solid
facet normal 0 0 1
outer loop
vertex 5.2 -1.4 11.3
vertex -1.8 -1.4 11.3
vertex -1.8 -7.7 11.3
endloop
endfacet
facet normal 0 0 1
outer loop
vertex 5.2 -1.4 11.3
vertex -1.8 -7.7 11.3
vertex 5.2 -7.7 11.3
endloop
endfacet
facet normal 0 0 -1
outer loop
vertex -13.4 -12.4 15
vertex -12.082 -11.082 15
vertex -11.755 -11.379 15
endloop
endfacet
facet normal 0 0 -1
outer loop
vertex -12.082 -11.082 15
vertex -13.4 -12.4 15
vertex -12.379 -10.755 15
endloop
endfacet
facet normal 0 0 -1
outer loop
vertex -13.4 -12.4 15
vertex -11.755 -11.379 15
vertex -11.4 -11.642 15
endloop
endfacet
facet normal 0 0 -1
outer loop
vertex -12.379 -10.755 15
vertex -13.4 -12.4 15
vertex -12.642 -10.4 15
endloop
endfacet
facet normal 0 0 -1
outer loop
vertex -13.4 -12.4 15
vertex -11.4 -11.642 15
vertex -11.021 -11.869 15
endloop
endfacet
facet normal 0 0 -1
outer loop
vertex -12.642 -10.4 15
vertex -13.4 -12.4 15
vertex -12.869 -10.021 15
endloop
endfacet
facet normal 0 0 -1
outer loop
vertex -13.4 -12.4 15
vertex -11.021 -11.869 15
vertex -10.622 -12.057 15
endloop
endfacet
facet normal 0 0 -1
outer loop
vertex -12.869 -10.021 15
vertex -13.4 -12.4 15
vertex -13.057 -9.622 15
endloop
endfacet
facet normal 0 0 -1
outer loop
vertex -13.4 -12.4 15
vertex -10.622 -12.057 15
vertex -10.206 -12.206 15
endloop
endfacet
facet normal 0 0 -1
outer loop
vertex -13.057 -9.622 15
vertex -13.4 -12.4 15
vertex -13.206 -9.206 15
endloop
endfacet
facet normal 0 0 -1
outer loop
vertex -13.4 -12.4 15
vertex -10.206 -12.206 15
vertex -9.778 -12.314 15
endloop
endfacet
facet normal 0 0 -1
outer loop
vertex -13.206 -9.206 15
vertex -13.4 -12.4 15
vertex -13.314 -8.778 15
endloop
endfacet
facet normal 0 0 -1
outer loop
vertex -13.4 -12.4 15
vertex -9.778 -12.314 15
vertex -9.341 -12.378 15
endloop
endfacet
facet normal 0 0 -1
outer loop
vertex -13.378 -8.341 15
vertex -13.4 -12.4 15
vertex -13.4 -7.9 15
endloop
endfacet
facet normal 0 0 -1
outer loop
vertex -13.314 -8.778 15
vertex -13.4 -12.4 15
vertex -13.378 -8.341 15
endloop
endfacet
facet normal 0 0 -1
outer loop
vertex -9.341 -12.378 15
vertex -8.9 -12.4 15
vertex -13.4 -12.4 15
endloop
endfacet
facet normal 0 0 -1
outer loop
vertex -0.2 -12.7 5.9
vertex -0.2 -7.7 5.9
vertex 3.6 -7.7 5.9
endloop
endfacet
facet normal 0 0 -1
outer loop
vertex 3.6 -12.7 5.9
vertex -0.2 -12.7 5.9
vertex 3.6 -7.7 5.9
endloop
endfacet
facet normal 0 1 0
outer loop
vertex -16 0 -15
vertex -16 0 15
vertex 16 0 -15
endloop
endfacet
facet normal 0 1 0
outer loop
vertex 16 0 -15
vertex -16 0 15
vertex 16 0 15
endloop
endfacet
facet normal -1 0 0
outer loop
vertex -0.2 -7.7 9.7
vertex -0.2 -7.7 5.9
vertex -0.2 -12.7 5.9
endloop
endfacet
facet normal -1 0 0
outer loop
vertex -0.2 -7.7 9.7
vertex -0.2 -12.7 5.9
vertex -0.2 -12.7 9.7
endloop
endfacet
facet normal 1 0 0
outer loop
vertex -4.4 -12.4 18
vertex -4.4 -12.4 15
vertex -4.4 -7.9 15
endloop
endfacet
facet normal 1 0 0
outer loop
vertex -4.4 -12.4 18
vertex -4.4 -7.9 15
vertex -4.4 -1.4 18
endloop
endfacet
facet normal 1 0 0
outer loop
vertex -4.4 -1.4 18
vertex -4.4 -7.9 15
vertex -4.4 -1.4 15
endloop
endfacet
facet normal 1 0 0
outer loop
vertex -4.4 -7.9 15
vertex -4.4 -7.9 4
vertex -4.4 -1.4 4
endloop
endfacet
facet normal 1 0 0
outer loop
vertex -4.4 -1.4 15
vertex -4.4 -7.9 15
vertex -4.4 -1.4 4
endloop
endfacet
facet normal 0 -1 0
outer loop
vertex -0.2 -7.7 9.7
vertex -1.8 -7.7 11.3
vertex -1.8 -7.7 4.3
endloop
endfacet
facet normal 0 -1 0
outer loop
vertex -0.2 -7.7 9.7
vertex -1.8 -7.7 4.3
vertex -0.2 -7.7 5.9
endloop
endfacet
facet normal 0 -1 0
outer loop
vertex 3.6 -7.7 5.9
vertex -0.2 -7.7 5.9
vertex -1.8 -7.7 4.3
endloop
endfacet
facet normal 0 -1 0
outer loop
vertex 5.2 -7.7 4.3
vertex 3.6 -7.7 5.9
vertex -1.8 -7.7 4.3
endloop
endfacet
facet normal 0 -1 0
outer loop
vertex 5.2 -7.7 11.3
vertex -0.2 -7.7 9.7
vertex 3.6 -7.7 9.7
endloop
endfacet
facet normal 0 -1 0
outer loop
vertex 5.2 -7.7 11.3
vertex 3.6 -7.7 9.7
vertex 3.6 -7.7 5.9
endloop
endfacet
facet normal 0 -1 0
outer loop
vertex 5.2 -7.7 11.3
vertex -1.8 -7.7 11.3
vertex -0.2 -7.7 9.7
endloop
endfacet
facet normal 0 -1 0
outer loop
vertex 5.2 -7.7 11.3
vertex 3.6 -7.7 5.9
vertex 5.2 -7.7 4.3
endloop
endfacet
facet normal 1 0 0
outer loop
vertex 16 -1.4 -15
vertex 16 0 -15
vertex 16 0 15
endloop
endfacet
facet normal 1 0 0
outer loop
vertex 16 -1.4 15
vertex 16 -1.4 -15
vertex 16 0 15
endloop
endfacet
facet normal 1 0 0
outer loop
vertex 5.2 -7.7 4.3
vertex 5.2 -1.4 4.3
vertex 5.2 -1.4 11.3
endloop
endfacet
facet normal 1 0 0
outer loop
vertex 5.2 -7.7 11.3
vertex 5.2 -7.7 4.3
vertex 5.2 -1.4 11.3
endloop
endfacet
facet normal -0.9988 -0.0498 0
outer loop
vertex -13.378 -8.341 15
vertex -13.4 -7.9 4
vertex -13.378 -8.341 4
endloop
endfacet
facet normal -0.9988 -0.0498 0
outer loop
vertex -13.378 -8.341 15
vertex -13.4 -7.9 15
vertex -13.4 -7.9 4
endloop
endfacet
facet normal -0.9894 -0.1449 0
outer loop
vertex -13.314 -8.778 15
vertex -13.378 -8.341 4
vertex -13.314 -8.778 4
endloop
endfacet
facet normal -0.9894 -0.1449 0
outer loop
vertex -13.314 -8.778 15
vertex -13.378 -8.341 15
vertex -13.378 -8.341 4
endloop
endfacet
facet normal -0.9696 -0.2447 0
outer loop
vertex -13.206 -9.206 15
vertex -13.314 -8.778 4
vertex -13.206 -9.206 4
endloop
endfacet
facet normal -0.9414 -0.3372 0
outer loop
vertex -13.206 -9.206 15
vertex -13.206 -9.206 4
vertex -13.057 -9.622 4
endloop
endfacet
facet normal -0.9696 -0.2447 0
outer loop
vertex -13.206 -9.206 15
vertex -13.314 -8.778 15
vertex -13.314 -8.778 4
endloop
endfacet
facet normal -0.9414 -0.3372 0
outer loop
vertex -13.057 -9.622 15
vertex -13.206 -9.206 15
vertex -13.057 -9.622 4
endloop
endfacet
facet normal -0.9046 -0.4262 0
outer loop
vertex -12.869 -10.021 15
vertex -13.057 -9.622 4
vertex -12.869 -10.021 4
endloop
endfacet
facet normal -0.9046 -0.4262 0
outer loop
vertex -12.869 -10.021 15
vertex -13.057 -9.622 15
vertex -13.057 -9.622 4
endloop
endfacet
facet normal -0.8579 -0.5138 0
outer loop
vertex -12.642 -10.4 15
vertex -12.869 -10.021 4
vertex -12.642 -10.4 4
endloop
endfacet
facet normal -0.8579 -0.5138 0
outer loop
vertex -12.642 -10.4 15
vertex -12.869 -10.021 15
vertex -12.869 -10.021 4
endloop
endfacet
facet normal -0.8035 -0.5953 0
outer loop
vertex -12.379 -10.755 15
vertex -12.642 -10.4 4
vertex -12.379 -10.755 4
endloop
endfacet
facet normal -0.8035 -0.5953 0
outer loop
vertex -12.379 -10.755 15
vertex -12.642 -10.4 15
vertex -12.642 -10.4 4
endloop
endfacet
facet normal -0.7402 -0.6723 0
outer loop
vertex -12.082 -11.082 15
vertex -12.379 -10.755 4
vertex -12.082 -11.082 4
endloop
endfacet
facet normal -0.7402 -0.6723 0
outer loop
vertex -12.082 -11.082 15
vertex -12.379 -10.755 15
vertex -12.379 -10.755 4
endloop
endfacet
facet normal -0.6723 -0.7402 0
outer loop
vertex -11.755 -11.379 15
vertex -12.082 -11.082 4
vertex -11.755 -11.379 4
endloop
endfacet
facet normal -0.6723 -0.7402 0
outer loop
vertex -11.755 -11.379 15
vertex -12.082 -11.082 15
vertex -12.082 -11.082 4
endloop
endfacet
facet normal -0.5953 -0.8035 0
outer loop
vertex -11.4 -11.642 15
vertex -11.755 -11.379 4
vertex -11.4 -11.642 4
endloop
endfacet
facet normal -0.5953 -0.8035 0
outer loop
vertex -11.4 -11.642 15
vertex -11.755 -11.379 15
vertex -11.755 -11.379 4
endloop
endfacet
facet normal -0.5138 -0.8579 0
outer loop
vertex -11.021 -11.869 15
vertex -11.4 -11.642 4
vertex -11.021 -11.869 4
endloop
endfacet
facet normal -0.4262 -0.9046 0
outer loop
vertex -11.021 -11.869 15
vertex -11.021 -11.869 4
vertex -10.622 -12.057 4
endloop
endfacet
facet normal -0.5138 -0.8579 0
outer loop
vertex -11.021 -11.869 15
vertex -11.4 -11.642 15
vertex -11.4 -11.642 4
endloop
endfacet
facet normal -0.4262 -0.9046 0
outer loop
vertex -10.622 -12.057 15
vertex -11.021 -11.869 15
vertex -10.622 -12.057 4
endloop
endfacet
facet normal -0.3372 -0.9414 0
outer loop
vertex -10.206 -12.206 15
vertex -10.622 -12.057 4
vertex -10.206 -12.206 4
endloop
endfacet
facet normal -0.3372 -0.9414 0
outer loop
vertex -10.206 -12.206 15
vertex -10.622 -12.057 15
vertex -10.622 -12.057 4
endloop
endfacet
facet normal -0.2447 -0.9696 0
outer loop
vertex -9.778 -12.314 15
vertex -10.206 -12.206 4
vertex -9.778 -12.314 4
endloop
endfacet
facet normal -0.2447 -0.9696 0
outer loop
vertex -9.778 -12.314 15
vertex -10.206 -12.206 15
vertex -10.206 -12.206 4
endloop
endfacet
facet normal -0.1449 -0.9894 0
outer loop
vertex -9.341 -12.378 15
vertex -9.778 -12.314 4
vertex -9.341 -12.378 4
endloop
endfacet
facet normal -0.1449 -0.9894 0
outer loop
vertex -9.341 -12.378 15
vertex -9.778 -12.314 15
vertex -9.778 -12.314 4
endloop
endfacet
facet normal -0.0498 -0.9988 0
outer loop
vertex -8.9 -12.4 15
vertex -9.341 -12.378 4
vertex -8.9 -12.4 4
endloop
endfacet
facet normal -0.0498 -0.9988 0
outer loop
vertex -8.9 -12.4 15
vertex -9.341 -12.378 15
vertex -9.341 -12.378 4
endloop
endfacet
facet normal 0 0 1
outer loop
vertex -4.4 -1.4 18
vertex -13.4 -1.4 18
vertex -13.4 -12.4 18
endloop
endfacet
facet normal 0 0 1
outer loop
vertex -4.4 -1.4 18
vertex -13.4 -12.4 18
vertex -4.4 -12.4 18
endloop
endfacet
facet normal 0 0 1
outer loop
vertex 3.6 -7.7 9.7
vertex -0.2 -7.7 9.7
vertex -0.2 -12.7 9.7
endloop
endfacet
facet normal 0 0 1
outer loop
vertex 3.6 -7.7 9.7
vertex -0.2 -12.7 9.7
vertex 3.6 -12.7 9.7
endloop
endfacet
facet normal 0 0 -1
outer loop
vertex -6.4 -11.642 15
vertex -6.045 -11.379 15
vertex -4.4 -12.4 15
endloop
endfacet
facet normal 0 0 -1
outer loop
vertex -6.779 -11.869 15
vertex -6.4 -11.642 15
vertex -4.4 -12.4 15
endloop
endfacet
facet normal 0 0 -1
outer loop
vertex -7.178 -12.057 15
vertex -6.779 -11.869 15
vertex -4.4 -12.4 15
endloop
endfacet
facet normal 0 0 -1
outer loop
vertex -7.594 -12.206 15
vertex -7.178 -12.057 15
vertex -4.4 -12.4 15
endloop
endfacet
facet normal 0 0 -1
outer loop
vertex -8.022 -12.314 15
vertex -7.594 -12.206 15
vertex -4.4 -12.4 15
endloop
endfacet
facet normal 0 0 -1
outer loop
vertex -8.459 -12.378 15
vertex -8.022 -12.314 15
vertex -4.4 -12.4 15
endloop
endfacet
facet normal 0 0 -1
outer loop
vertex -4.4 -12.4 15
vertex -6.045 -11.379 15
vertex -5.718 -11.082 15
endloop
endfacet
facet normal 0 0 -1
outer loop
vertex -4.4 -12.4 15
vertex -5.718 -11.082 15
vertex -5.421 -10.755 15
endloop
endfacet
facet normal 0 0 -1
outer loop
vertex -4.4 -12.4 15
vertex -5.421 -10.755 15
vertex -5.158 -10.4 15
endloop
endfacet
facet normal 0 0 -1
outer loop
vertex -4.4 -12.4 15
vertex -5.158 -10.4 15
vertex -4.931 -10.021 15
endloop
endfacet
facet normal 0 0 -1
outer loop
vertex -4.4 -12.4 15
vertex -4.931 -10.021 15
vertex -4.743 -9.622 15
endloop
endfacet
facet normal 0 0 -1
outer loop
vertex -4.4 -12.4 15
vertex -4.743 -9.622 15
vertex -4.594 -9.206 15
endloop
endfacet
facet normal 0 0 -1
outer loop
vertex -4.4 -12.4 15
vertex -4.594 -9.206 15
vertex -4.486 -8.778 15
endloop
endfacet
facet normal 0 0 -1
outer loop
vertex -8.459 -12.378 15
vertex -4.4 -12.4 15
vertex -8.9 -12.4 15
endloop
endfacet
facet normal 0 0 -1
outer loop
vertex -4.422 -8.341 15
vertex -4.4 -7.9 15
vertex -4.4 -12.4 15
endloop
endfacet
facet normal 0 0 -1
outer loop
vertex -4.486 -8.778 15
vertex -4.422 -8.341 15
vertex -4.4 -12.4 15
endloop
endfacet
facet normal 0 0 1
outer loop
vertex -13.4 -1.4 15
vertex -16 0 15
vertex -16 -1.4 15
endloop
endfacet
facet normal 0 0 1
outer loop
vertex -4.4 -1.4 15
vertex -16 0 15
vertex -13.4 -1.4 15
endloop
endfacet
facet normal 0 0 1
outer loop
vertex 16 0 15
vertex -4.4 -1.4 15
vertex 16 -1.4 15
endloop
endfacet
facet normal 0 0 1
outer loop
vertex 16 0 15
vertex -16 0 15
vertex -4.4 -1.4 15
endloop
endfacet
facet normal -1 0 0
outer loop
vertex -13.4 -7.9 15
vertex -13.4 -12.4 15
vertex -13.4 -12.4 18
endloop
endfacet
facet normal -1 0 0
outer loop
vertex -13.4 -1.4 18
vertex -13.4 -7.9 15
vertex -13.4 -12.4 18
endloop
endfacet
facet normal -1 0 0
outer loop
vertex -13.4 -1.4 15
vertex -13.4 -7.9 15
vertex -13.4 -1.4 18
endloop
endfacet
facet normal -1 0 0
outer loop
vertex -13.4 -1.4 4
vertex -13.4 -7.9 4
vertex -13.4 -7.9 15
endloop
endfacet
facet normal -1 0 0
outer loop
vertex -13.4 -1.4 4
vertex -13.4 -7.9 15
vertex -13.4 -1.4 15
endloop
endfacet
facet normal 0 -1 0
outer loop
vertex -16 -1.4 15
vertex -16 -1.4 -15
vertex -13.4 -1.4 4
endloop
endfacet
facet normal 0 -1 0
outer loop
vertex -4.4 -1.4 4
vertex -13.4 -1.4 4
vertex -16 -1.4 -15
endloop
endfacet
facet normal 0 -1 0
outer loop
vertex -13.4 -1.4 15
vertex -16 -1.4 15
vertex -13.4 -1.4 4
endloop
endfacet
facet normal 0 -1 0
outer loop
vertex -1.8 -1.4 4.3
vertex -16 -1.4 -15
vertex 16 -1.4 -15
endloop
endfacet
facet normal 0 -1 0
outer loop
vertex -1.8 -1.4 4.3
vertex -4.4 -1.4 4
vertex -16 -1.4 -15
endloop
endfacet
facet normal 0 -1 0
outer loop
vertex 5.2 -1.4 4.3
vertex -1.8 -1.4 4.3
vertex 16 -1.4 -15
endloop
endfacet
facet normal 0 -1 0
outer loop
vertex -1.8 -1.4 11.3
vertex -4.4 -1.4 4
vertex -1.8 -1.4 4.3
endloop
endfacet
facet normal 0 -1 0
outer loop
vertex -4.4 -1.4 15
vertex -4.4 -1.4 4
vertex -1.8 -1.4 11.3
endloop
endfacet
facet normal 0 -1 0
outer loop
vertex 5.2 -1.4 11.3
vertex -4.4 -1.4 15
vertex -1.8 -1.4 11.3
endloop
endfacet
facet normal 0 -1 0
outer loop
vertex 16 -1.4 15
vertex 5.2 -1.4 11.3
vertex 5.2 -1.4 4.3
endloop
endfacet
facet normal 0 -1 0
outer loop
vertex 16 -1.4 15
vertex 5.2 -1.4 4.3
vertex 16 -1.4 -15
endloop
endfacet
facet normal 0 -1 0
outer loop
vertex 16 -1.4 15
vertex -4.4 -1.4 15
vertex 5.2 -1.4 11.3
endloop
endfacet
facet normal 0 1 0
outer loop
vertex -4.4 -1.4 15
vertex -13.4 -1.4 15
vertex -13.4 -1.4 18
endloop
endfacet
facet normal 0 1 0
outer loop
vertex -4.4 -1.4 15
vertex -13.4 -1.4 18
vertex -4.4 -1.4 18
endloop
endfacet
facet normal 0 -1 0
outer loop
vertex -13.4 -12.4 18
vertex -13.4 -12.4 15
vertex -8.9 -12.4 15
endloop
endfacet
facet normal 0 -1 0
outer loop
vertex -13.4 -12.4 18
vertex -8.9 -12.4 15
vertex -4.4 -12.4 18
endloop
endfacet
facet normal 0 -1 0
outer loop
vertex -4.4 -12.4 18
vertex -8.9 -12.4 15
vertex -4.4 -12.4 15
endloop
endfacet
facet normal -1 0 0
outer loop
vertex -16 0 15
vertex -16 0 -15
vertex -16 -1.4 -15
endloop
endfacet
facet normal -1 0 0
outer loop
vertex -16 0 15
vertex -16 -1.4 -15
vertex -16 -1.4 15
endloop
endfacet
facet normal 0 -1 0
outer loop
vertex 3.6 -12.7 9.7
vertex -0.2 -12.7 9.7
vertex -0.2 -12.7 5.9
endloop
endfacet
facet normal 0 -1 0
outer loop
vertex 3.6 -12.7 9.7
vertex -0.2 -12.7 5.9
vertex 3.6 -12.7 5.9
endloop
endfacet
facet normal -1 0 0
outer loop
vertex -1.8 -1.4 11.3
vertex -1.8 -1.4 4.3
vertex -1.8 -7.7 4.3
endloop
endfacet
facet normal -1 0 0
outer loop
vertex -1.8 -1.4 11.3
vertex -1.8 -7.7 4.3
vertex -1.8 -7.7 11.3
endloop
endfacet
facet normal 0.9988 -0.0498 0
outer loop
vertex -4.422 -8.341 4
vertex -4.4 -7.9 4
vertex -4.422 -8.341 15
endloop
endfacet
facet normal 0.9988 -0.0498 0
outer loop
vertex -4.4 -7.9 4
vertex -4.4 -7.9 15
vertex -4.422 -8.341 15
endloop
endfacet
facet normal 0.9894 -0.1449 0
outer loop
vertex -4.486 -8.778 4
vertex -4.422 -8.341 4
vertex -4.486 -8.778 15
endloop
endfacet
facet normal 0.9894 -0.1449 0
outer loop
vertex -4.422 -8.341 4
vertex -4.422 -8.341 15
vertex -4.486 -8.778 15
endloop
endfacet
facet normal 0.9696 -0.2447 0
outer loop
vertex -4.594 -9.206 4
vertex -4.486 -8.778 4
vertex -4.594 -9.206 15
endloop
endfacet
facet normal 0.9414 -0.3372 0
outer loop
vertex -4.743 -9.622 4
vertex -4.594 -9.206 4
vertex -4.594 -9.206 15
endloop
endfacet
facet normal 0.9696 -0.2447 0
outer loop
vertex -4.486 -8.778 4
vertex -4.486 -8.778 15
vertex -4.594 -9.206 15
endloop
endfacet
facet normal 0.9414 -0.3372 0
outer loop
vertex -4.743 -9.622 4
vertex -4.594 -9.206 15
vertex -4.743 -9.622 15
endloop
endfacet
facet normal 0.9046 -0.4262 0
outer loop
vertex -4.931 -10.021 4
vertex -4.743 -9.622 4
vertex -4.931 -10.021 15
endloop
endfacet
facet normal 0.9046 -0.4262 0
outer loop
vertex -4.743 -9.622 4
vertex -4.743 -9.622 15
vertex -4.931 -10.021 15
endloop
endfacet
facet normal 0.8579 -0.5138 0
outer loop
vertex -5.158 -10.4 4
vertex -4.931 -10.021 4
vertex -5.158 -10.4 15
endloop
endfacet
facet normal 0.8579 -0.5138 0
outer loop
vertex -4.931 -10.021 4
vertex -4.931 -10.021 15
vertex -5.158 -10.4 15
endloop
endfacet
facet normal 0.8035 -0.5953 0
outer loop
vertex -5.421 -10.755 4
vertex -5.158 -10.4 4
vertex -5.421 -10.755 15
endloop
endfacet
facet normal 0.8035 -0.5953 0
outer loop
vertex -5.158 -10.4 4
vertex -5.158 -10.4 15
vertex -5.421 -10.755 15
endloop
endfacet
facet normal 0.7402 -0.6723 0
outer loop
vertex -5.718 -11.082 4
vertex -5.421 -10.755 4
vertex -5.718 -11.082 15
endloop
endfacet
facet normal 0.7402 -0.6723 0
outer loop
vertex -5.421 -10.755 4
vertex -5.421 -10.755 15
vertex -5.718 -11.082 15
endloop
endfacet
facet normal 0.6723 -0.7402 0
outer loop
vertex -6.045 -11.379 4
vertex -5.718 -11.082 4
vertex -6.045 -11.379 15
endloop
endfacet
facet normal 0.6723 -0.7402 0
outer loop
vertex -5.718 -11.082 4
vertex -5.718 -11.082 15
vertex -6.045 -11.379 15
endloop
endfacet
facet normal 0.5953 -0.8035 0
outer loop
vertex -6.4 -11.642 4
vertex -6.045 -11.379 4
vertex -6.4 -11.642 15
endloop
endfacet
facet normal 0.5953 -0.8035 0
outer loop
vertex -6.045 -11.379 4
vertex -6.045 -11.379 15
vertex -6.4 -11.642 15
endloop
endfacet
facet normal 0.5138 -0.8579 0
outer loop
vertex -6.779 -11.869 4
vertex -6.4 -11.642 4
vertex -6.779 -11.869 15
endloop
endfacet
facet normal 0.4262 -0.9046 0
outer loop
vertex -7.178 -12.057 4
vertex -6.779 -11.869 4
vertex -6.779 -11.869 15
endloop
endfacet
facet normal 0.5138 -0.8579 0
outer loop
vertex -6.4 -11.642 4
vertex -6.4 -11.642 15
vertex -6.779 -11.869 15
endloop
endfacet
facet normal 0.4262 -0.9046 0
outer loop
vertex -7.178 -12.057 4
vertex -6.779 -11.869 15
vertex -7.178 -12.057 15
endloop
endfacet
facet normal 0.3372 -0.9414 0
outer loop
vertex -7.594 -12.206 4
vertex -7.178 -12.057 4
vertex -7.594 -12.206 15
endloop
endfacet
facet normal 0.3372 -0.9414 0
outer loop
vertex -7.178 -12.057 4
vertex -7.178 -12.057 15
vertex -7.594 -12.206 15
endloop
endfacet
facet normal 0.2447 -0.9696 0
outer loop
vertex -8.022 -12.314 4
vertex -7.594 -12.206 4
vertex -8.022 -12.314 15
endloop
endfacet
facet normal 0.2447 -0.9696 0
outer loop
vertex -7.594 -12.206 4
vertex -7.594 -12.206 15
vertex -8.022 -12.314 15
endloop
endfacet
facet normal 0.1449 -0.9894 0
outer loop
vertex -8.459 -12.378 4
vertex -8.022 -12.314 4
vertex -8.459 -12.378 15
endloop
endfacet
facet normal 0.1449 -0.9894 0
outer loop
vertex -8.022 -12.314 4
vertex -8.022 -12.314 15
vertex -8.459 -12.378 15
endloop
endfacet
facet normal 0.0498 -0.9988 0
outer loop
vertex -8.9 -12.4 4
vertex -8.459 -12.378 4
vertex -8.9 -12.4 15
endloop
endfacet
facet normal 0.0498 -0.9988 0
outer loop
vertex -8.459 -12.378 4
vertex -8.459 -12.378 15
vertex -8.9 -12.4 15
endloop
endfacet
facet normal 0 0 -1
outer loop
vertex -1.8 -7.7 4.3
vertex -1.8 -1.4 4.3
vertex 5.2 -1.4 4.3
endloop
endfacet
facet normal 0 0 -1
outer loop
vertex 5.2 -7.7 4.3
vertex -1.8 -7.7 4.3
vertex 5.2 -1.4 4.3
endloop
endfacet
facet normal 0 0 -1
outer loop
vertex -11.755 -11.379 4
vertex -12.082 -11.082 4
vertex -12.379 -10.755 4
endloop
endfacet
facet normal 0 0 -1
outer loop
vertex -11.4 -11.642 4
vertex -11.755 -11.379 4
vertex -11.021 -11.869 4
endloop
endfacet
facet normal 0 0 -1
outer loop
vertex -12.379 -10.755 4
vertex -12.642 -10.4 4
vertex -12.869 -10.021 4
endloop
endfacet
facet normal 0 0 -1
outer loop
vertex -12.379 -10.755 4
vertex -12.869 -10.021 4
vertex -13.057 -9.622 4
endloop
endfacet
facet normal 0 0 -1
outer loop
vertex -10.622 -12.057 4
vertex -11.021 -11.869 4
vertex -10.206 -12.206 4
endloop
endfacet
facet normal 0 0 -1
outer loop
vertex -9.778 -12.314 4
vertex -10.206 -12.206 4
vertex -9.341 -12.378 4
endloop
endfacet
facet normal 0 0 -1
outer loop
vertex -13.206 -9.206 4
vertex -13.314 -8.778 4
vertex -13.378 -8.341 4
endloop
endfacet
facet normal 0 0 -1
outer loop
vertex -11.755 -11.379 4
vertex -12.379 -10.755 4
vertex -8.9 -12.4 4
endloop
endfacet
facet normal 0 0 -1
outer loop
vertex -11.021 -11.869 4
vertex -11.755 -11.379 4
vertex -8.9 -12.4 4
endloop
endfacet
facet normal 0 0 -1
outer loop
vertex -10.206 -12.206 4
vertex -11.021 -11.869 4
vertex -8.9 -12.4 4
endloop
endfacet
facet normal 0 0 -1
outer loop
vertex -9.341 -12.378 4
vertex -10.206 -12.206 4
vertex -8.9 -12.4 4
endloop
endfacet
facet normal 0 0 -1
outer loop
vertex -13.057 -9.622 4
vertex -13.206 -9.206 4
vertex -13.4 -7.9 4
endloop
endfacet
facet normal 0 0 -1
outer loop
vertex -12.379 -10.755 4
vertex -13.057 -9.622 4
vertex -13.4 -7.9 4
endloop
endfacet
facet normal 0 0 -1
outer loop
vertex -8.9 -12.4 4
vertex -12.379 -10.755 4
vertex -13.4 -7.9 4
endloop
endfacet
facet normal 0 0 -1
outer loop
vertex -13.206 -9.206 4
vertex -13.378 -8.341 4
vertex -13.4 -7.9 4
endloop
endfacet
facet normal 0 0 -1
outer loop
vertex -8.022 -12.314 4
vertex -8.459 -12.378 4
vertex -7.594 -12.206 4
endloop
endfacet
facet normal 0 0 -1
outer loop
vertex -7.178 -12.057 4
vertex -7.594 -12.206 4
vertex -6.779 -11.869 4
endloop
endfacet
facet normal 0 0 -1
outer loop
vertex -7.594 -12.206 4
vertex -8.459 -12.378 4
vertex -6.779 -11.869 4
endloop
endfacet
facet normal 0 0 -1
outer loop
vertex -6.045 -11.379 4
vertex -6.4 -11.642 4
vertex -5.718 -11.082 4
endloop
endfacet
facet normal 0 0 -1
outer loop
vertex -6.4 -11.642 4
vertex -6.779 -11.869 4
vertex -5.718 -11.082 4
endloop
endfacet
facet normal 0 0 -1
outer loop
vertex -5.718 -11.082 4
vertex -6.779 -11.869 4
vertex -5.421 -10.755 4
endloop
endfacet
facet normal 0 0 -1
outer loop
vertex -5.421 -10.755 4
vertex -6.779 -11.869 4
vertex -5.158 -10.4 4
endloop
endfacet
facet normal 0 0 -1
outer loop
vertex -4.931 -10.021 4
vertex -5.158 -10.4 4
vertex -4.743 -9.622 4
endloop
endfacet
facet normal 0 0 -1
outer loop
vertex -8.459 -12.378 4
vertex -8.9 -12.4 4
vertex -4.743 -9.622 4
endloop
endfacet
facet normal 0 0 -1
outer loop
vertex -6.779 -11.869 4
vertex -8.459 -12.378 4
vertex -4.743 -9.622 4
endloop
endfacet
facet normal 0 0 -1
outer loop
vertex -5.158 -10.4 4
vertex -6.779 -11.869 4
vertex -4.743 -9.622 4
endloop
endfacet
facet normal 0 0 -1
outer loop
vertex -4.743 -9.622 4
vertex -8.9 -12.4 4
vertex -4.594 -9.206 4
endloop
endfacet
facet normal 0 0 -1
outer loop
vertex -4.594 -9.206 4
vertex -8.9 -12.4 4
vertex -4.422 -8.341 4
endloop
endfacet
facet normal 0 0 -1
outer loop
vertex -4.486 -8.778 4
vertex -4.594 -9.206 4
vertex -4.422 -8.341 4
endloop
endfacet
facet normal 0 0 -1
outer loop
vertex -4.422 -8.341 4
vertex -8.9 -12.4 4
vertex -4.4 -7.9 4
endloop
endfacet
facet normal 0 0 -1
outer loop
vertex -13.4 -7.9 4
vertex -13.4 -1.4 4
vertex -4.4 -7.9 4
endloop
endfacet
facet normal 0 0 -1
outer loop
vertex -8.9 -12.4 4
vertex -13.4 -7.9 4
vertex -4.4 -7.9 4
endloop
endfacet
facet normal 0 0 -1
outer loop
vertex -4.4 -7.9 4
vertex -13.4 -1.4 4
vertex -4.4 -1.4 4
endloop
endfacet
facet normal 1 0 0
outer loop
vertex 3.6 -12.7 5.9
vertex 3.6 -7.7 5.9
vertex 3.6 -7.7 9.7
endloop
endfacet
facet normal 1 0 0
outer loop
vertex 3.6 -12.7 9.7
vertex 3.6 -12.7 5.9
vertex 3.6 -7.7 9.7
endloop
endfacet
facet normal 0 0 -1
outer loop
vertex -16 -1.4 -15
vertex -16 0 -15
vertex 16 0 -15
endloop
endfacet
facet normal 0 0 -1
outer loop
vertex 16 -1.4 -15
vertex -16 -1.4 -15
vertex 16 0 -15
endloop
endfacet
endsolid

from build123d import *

# Parameters (mm, degrees)
F0_W      = 32
F0_H      = 30
F1_DEPTH  = 1.4
F2_W      = 9
F2_H      = 11
F3_DEPTH  = 11
F4_R      = 4.49999
F6_W      = 7
F6_H      = 7
F7_DEPTH  = 6.3
F8_W      = 3.8
F8_H      = 3.8
F9_DEPTH  = 5
F5_W      = 9
F5_H      = 11
F10_DEPTH = 3


# Not quite as in the source:
# - a fillet or chamfer is up to 0.001 mm smaller than in the source, because OpenCascade refuses the exact size


with BuildPart() as f1:
    # F0 (on Front) → F1 (new body)
    with BuildSketch(Plane.XZ):
        Rectangle(F0_W, F0_H)
    extrude(amount=F1_DEPTH)

    # F2 (on face) → F3 (join)
    with BuildSketch(Plane.XZ.offset(1.4)):
        with Locations((-8.9, 9.5)):
            Rectangle(F2_W, F2_H)
    extrude(amount=F3_DEPTH)

    # F4 (radius 4.5 in the source; OpenCascade refuses exactly that, so slightly less here)
    f4_edges = [f1.edges().sort_by_distance(p)[0] for p in [
        (-4.4, -12.4, 9.5),
        (-13.4, -12.4, 9.5),
    ]]
    fillet(f4_edges, radius=F4_R)

    # F6 (on face) → F7 (join)
    with BuildSketch(Plane.XZ.offset(1.4)):
        with Locations((1.7, 7.8)):
            Rectangle(F6_W, F6_H)
    extrude(amount=F7_DEPTH)

    # F8 (on face) → F9 (join)
    with BuildSketch(Plane.XZ.offset(7.7)):
        with Locations((1.7, 7.8)):
            Rectangle(F8_W, F8_H)
    extrude(amount=F9_DEPTH)

    # F5 (on face) → F10 (join)
    with BuildSketch(Plane.XY.offset(15)):
        with Locations((-8.9, -6.9)):
            Rectangle(F5_W, F5_H)
    extrude(amount=F10_DEPTH)


solid = f1.part
